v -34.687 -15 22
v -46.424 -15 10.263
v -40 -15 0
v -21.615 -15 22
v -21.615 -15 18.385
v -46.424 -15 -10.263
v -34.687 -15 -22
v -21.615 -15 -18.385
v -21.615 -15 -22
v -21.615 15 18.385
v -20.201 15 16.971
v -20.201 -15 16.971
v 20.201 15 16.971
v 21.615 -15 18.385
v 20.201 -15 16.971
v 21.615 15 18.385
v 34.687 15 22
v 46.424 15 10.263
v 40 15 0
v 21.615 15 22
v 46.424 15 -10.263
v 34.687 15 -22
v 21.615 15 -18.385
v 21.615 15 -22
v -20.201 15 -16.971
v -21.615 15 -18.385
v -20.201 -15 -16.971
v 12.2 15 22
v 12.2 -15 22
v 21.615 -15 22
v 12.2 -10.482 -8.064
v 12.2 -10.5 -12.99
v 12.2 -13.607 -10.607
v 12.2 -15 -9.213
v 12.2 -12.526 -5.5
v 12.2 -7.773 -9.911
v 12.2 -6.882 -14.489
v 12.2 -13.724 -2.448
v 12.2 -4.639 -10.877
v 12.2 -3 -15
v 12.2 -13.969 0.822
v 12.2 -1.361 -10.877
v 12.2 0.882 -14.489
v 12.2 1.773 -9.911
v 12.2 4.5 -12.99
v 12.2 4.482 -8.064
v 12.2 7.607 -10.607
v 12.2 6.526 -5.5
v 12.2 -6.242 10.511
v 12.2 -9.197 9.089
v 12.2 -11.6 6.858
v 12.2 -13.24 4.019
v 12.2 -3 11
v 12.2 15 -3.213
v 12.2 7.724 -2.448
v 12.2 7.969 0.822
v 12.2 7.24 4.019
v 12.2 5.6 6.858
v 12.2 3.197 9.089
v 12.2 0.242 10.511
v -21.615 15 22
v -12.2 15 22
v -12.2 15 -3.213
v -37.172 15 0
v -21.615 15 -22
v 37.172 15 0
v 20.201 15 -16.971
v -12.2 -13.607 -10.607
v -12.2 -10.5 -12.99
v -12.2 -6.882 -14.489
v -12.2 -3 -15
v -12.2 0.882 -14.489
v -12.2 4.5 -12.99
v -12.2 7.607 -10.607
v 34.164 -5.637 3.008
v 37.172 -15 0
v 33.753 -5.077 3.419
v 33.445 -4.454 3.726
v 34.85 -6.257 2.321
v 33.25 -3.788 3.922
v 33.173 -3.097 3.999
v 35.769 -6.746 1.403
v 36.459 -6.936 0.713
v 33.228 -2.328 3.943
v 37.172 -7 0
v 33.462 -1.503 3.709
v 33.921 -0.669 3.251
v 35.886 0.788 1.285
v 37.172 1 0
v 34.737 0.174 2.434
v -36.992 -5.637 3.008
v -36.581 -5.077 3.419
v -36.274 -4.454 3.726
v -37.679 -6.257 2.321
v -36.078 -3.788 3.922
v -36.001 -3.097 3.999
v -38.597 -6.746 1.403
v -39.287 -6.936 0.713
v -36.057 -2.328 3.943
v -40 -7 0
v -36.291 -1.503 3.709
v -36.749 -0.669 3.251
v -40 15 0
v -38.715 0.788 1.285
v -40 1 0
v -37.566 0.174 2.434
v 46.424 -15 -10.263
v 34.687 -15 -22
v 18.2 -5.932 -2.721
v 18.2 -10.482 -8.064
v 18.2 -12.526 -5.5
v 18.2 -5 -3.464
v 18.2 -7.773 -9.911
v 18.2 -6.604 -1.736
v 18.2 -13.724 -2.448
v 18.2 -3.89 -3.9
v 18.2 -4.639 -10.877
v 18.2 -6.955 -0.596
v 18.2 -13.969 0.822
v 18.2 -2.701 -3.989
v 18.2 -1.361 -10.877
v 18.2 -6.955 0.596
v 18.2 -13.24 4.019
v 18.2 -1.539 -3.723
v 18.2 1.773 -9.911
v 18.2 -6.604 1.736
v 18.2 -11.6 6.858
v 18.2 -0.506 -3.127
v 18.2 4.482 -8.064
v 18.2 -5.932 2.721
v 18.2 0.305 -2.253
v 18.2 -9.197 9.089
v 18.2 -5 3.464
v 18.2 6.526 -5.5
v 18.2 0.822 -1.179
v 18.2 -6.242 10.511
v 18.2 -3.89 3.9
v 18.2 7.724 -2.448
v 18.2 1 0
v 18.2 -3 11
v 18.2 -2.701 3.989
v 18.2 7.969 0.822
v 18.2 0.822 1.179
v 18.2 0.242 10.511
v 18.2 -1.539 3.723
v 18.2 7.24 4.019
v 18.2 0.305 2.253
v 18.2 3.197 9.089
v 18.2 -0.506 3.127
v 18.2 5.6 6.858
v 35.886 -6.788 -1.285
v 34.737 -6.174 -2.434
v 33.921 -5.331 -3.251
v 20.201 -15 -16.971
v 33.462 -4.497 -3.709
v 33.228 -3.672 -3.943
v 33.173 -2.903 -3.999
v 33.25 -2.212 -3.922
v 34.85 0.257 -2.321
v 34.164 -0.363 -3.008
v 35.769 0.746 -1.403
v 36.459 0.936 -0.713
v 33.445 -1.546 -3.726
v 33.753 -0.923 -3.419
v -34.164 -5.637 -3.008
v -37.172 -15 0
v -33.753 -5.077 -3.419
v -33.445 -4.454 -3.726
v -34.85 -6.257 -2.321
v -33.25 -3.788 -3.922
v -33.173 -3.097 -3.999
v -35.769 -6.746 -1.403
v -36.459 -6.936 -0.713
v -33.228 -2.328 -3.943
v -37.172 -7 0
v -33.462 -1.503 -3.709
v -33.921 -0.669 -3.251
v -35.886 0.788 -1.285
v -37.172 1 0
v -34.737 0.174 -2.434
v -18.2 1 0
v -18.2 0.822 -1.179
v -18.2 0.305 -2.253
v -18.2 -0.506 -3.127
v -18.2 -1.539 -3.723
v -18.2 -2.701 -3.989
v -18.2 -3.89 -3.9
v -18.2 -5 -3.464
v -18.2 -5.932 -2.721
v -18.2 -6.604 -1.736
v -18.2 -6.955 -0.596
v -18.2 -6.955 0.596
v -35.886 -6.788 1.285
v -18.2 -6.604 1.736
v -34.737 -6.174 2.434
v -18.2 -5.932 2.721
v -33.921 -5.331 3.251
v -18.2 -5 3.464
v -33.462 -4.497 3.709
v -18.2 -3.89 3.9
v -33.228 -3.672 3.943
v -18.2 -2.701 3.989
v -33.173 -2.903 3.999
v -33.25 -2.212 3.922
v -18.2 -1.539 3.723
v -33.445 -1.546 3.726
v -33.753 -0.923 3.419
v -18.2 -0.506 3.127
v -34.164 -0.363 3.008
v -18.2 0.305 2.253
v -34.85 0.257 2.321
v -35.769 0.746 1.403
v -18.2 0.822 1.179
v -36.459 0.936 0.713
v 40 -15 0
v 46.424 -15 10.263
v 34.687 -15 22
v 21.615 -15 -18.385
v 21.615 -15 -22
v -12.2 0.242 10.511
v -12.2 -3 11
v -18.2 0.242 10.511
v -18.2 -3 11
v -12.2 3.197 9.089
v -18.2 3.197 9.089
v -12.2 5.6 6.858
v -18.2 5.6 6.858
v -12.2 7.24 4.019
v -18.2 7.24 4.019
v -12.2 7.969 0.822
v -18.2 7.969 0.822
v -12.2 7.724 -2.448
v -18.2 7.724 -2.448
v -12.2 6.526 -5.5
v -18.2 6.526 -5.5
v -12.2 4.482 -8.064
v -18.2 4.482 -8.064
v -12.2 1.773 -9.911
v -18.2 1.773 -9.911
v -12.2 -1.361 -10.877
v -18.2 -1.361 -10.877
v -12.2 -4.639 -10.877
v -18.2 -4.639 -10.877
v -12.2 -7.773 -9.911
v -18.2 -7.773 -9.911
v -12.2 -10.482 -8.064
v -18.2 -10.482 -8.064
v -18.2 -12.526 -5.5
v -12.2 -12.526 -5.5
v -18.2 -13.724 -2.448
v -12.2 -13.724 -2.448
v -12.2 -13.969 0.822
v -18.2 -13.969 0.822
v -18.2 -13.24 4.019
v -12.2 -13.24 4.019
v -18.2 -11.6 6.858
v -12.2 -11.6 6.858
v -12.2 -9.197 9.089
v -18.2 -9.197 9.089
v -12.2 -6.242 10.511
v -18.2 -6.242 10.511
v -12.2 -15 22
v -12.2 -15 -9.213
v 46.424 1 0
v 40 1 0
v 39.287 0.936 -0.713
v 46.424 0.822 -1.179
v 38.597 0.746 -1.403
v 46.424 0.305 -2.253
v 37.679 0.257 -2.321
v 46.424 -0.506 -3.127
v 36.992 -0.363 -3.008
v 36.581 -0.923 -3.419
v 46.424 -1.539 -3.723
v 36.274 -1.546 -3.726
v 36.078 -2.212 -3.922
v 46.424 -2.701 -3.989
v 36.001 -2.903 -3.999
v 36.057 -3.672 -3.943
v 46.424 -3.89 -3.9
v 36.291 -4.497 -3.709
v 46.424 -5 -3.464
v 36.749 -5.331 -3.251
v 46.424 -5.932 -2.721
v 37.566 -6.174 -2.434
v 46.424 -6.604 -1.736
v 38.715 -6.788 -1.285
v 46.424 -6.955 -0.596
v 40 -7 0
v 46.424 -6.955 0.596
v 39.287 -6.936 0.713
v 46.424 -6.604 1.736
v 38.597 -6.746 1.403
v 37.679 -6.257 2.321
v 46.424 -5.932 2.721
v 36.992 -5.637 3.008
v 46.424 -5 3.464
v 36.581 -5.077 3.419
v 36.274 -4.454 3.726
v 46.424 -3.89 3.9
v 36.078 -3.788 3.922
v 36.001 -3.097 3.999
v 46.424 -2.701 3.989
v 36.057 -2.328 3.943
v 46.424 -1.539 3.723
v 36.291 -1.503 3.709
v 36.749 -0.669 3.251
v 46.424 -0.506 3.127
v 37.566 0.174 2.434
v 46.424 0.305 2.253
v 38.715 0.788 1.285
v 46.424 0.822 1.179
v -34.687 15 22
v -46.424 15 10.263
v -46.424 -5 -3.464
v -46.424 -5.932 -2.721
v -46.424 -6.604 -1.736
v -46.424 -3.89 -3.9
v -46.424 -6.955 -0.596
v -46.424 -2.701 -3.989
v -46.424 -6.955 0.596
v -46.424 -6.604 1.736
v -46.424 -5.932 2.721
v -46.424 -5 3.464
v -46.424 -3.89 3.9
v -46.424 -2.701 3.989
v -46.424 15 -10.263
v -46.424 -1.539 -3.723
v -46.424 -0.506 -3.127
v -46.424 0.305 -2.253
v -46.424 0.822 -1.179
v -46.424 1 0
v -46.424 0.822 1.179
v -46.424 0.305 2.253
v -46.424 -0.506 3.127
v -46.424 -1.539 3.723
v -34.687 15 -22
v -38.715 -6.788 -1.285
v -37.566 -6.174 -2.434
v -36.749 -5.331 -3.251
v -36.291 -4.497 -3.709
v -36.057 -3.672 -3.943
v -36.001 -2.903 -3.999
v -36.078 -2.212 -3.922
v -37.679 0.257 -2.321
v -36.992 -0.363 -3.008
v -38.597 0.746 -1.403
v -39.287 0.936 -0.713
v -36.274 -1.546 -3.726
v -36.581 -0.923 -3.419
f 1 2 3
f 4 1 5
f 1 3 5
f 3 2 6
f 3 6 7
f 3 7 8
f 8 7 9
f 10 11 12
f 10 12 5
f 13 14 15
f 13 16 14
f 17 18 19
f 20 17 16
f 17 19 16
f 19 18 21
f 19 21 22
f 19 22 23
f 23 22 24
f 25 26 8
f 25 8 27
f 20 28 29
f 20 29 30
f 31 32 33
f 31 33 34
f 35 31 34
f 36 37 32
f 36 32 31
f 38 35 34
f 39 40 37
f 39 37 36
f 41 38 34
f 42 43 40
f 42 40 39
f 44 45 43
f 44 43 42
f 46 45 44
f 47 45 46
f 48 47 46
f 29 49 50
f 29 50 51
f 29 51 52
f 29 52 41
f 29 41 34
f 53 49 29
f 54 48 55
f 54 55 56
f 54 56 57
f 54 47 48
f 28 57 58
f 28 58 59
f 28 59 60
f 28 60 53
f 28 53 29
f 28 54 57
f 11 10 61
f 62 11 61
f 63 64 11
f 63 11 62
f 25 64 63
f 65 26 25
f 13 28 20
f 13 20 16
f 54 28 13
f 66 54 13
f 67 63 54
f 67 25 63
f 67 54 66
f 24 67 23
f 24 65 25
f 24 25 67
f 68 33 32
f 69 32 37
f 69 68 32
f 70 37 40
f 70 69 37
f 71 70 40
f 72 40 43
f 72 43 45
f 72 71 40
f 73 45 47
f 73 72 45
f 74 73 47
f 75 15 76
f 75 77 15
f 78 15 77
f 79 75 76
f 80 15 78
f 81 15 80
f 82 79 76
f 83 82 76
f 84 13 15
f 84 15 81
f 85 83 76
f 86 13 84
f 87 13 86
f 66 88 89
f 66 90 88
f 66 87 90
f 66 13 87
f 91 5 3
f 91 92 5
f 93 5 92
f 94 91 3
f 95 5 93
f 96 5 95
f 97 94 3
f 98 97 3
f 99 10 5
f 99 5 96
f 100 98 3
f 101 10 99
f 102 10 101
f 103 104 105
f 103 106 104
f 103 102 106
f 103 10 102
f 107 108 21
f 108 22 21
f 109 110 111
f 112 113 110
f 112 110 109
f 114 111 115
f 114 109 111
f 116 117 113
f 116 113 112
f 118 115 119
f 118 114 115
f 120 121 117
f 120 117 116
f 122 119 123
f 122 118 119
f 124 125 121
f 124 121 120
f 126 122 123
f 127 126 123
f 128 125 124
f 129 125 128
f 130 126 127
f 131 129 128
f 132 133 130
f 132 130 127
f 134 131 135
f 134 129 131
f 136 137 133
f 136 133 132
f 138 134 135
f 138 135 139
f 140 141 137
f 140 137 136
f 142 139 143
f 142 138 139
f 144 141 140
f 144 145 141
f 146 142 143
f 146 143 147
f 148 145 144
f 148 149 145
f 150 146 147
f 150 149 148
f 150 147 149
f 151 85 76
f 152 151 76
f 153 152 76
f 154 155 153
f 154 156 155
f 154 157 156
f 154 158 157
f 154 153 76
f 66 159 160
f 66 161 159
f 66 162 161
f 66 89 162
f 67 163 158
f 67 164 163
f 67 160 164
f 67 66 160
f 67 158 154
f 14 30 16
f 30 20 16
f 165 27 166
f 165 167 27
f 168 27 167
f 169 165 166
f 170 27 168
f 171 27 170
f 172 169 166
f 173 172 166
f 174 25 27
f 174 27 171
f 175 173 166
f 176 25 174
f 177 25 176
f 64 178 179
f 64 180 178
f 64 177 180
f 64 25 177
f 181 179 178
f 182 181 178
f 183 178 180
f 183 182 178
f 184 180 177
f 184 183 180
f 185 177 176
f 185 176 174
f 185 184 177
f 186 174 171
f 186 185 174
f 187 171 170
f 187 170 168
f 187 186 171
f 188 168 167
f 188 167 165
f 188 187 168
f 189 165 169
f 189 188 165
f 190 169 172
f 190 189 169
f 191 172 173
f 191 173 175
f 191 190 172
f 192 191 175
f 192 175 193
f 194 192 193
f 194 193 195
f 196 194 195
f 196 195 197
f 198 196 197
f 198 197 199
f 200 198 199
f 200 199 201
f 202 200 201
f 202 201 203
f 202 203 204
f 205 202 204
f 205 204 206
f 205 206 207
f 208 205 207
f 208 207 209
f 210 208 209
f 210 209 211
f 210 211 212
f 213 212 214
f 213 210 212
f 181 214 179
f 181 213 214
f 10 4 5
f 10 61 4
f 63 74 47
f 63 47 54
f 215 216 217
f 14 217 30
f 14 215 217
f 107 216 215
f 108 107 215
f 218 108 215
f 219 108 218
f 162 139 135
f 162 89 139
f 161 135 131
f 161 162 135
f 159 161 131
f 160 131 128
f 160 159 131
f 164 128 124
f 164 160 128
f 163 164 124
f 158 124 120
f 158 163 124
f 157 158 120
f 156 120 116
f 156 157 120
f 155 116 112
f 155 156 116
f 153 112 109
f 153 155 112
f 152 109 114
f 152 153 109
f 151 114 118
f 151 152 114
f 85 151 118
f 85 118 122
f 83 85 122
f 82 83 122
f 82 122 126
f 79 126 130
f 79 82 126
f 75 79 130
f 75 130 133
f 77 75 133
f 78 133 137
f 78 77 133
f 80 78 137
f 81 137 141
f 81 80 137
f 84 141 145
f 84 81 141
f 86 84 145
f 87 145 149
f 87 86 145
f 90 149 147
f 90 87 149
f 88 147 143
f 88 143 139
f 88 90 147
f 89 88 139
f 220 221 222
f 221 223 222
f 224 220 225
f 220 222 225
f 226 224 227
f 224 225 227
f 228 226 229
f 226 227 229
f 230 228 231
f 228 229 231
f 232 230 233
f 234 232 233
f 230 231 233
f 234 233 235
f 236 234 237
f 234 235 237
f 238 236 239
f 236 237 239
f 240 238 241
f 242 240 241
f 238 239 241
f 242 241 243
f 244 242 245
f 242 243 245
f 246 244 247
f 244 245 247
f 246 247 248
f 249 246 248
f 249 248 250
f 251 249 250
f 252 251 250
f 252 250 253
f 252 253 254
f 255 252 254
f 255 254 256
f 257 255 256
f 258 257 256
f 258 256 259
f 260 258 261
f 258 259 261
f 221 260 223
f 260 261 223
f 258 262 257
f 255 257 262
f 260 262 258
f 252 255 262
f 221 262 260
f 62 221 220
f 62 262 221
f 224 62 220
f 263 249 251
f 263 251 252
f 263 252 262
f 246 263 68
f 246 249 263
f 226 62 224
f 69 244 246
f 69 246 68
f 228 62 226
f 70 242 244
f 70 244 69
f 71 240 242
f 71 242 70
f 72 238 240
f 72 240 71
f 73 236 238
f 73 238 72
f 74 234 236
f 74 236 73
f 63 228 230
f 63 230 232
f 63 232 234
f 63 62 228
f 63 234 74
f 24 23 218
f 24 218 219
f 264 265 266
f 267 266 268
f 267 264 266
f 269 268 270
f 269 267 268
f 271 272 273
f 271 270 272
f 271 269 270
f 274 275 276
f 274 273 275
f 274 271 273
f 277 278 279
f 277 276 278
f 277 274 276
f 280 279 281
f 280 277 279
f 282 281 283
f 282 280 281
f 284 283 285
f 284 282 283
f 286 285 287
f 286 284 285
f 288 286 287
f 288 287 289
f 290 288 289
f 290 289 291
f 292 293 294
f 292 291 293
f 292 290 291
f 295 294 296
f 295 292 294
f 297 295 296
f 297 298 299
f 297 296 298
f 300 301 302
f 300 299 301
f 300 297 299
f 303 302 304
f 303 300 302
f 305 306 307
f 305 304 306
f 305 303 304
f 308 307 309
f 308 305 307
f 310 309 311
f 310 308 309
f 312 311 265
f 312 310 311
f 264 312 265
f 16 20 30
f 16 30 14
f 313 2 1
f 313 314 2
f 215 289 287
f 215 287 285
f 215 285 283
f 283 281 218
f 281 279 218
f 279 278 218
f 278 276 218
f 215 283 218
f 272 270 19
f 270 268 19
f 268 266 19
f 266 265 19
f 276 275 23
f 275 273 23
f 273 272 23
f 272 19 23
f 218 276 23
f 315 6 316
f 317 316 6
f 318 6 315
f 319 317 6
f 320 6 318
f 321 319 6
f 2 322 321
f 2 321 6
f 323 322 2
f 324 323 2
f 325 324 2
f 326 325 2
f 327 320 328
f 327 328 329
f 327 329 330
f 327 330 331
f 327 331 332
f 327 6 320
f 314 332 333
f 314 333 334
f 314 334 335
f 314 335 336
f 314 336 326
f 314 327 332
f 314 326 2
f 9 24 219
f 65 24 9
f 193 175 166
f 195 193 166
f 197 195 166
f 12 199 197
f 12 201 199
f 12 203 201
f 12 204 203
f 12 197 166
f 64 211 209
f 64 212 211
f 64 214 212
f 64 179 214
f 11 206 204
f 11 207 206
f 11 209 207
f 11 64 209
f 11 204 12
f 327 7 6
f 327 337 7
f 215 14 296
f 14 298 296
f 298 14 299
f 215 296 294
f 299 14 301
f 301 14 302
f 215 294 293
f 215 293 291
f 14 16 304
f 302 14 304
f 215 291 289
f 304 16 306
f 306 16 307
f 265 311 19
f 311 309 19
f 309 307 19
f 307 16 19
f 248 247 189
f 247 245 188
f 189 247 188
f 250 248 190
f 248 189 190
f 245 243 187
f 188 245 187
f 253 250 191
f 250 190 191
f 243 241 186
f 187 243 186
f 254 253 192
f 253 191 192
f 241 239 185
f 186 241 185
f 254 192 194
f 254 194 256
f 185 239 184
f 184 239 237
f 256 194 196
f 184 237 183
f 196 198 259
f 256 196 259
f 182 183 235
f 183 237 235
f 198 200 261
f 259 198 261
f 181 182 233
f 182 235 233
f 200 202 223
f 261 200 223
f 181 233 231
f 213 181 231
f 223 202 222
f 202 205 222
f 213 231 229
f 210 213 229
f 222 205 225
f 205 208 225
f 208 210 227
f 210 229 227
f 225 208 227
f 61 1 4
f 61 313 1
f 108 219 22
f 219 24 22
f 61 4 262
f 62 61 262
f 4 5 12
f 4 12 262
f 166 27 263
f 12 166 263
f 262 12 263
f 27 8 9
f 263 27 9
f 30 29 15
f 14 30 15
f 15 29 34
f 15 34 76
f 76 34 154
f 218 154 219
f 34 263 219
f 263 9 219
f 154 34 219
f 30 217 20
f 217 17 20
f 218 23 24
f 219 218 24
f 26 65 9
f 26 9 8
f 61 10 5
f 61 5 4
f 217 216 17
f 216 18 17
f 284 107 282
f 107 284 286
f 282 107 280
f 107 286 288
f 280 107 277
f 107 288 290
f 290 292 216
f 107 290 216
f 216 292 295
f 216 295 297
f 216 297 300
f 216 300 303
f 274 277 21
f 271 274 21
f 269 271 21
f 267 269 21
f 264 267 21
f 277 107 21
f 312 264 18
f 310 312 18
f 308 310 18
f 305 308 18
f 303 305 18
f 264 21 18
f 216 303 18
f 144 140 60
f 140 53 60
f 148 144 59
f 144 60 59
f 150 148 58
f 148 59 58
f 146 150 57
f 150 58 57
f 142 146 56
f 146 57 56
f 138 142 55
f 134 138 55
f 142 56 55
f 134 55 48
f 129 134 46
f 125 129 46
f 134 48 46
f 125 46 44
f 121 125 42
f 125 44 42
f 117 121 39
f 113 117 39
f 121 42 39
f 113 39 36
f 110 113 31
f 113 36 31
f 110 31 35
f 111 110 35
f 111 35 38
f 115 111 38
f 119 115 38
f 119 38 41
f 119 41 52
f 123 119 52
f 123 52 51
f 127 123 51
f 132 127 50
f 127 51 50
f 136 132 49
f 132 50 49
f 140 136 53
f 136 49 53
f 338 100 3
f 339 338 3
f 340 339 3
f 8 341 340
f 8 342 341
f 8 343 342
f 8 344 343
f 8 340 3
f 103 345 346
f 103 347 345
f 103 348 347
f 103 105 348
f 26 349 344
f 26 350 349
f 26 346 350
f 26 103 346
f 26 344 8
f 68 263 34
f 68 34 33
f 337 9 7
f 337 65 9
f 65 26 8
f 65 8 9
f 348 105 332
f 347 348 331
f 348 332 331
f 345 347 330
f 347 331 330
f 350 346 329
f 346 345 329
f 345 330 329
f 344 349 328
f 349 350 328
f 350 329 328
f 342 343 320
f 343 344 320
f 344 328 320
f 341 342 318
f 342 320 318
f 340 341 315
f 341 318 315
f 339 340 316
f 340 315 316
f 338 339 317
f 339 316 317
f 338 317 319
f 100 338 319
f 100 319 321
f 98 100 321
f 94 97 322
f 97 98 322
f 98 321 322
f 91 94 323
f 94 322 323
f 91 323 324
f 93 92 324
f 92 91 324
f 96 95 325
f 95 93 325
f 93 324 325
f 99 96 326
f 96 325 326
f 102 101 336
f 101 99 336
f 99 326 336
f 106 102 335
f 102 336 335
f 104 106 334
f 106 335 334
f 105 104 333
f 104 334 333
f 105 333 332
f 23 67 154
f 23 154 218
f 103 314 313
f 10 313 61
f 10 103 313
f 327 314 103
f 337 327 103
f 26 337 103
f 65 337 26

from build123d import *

# Parameters (mm, degrees)
BOSS_EXTRUDE1_DEPTH     = 15
BOSS_EXTRUDE2_DEPTH     = 15
SKETCH5_R               = 11
SKETCH5_R_2             = 4
CUT_EXTRUDE1_DEPTH      = 18.2
CUT_EXTRUDE2_DEPTH      = 54.517820911
CUT_EXTRUDE2_DEPTH_BACK = 54.517820911
SKETCH5_2_R             = 4
CUT_EXTRUDE3_START      = -12.2
CUT_EXTRUDE3_DEPTH      = 24.4


# Read off the part's stored shape, not the designer's step: Cut-Extrude3
with BuildPart() as part:
    # Sketch3 → Boss-Extrude1 (new, symmetric)
    with BuildSketch(Plane(origin=(0, 0, 0), x_dir=(1, 0, 0), z_dir=(0, 1, 0))):
        Polygon((37.171572875, 0), (20.201010127, 16.970562748), (21.615223689, 18.384776311), (21.615223689, 22), (12.2, 22), (-12.2, 22), (-21.615223689, 22), (-21.615223689, 18.384776311), (-20.201010127, 16.970562748), (-37.171572875, 0), (-20.201010127, -16.970562748), (-21.615223689, -18.384776311), (-21.615223689, -22), (-12.2, -22), (-12.2, 0), (12.2, 0), (12.2, -22), (21.615223689, -22), (21.615223689, -18.384776311), (20.201010127, -16.970562748), align=None)
    extrude(amount=BOSS_EXTRUDE1_DEPTH, both=True)

    # Sketch5 → Cut-Extrude1 (cut, symmetric)
    with BuildSketch(Plane.ZY):
        with Locations((0, -3)):
            Circle(SKETCH5_R)
        with Locations((0, -3)):
            Circle(SKETCH5_R_2, mode=Mode.SUBTRACT)
    extrude(amount=CUT_EXTRUDE1_DEPTH, both=True, mode=Mode.SUBTRACT)


with BuildPart() as body_2:
    # Sketch4 → Boss-Extrude2 (new, symmetric)
    with BuildSketch(Plane(origin=(0, 0, 0), x_dir=(1, 0, 0), z_dir=(0, 1, 0))):
        Polygon((21.615223689, 18.384776311), (21.615223689, 22), (34.687078818, 22), (46.423670202, 10.263408616), (46.423670202, -10.263408616), (34.687078818, -22), (21.615223689, -22), (21.615223689, -18.384776311), (40, 0), align=None)
    extrude(amount=BOSS_EXTRUDE2_DEPTH, both=True)


with BuildPart() as cut_extrude2_tool:
    # Sketch5<2> → Cut-Extrude2 (new, two sides: drawn at the far end of the back side and taken through both)
    with BuildSketch(Plane.ZY.offset(-CUT_EXTRUDE2_DEPTH_BACK)):
        with Locations(Location((0, -3, 0), (0, 0, 90))):
            Circle(SKETCH5_2_R)
    extrude(amount=CUT_EXTRUDE2_DEPTH + CUT_EXTRUDE2_DEPTH_BACK)


with BuildPart() as part_1:
    add(part.part)

    # Cut-Extrude2: cut by cut_extrude2_tool
    add(cut_extrude2_tool.part, mode=Mode.SUBTRACT)

    # Cut-Extrude3 outline → Cut-Extrude3 (cut)
    with BuildSketch(Plane(origin=(0, 0, 0), x_dir=(0, 0, -1), z_dir=(1, 0, 0)).offset(CUT_EXTRUDE3_START)):
        with BuildLine():
            Line((0, -15), (9.213203436, -15))
            Line((9.213203436, -15), (10.606601718, -13.606601718))
            ThreePointArc((10.606601718, -13.606601718), (15, -3), (10.606601718, 7.606601718))
            Line((10.606601718, 7.606601718), (3.213203436, 15))
            Line((3.213203436, 15), (0, 15))
            Line((0, 15), (0, 8))
            ThreePointArc((0, 8), (11, -3), (0, -14))
            Line((0, -14), (0, -15))
        make_face()
    extrude(amount=CUT_EXTRUDE3_DEPTH, mode=Mode.SUBTRACT)


with BuildPart() as body_2_1:
    add(body_2.part)

    # Cut-Extrude2: cut by cut_extrude2_tool
    add(cut_extrude2_tool.part, mode=Mode.SUBTRACT)


with BuildPart() as body_3:
    # Mirror1: mirrored copy
    add(body_2_1.part.mirror(Plane(origin=(0, 0, 0), x_dir=(0, 0, 1), z_dir=(1, 0, 0))))


solid = Compound([part_1.part, body_2_1.part, body_3.part])
